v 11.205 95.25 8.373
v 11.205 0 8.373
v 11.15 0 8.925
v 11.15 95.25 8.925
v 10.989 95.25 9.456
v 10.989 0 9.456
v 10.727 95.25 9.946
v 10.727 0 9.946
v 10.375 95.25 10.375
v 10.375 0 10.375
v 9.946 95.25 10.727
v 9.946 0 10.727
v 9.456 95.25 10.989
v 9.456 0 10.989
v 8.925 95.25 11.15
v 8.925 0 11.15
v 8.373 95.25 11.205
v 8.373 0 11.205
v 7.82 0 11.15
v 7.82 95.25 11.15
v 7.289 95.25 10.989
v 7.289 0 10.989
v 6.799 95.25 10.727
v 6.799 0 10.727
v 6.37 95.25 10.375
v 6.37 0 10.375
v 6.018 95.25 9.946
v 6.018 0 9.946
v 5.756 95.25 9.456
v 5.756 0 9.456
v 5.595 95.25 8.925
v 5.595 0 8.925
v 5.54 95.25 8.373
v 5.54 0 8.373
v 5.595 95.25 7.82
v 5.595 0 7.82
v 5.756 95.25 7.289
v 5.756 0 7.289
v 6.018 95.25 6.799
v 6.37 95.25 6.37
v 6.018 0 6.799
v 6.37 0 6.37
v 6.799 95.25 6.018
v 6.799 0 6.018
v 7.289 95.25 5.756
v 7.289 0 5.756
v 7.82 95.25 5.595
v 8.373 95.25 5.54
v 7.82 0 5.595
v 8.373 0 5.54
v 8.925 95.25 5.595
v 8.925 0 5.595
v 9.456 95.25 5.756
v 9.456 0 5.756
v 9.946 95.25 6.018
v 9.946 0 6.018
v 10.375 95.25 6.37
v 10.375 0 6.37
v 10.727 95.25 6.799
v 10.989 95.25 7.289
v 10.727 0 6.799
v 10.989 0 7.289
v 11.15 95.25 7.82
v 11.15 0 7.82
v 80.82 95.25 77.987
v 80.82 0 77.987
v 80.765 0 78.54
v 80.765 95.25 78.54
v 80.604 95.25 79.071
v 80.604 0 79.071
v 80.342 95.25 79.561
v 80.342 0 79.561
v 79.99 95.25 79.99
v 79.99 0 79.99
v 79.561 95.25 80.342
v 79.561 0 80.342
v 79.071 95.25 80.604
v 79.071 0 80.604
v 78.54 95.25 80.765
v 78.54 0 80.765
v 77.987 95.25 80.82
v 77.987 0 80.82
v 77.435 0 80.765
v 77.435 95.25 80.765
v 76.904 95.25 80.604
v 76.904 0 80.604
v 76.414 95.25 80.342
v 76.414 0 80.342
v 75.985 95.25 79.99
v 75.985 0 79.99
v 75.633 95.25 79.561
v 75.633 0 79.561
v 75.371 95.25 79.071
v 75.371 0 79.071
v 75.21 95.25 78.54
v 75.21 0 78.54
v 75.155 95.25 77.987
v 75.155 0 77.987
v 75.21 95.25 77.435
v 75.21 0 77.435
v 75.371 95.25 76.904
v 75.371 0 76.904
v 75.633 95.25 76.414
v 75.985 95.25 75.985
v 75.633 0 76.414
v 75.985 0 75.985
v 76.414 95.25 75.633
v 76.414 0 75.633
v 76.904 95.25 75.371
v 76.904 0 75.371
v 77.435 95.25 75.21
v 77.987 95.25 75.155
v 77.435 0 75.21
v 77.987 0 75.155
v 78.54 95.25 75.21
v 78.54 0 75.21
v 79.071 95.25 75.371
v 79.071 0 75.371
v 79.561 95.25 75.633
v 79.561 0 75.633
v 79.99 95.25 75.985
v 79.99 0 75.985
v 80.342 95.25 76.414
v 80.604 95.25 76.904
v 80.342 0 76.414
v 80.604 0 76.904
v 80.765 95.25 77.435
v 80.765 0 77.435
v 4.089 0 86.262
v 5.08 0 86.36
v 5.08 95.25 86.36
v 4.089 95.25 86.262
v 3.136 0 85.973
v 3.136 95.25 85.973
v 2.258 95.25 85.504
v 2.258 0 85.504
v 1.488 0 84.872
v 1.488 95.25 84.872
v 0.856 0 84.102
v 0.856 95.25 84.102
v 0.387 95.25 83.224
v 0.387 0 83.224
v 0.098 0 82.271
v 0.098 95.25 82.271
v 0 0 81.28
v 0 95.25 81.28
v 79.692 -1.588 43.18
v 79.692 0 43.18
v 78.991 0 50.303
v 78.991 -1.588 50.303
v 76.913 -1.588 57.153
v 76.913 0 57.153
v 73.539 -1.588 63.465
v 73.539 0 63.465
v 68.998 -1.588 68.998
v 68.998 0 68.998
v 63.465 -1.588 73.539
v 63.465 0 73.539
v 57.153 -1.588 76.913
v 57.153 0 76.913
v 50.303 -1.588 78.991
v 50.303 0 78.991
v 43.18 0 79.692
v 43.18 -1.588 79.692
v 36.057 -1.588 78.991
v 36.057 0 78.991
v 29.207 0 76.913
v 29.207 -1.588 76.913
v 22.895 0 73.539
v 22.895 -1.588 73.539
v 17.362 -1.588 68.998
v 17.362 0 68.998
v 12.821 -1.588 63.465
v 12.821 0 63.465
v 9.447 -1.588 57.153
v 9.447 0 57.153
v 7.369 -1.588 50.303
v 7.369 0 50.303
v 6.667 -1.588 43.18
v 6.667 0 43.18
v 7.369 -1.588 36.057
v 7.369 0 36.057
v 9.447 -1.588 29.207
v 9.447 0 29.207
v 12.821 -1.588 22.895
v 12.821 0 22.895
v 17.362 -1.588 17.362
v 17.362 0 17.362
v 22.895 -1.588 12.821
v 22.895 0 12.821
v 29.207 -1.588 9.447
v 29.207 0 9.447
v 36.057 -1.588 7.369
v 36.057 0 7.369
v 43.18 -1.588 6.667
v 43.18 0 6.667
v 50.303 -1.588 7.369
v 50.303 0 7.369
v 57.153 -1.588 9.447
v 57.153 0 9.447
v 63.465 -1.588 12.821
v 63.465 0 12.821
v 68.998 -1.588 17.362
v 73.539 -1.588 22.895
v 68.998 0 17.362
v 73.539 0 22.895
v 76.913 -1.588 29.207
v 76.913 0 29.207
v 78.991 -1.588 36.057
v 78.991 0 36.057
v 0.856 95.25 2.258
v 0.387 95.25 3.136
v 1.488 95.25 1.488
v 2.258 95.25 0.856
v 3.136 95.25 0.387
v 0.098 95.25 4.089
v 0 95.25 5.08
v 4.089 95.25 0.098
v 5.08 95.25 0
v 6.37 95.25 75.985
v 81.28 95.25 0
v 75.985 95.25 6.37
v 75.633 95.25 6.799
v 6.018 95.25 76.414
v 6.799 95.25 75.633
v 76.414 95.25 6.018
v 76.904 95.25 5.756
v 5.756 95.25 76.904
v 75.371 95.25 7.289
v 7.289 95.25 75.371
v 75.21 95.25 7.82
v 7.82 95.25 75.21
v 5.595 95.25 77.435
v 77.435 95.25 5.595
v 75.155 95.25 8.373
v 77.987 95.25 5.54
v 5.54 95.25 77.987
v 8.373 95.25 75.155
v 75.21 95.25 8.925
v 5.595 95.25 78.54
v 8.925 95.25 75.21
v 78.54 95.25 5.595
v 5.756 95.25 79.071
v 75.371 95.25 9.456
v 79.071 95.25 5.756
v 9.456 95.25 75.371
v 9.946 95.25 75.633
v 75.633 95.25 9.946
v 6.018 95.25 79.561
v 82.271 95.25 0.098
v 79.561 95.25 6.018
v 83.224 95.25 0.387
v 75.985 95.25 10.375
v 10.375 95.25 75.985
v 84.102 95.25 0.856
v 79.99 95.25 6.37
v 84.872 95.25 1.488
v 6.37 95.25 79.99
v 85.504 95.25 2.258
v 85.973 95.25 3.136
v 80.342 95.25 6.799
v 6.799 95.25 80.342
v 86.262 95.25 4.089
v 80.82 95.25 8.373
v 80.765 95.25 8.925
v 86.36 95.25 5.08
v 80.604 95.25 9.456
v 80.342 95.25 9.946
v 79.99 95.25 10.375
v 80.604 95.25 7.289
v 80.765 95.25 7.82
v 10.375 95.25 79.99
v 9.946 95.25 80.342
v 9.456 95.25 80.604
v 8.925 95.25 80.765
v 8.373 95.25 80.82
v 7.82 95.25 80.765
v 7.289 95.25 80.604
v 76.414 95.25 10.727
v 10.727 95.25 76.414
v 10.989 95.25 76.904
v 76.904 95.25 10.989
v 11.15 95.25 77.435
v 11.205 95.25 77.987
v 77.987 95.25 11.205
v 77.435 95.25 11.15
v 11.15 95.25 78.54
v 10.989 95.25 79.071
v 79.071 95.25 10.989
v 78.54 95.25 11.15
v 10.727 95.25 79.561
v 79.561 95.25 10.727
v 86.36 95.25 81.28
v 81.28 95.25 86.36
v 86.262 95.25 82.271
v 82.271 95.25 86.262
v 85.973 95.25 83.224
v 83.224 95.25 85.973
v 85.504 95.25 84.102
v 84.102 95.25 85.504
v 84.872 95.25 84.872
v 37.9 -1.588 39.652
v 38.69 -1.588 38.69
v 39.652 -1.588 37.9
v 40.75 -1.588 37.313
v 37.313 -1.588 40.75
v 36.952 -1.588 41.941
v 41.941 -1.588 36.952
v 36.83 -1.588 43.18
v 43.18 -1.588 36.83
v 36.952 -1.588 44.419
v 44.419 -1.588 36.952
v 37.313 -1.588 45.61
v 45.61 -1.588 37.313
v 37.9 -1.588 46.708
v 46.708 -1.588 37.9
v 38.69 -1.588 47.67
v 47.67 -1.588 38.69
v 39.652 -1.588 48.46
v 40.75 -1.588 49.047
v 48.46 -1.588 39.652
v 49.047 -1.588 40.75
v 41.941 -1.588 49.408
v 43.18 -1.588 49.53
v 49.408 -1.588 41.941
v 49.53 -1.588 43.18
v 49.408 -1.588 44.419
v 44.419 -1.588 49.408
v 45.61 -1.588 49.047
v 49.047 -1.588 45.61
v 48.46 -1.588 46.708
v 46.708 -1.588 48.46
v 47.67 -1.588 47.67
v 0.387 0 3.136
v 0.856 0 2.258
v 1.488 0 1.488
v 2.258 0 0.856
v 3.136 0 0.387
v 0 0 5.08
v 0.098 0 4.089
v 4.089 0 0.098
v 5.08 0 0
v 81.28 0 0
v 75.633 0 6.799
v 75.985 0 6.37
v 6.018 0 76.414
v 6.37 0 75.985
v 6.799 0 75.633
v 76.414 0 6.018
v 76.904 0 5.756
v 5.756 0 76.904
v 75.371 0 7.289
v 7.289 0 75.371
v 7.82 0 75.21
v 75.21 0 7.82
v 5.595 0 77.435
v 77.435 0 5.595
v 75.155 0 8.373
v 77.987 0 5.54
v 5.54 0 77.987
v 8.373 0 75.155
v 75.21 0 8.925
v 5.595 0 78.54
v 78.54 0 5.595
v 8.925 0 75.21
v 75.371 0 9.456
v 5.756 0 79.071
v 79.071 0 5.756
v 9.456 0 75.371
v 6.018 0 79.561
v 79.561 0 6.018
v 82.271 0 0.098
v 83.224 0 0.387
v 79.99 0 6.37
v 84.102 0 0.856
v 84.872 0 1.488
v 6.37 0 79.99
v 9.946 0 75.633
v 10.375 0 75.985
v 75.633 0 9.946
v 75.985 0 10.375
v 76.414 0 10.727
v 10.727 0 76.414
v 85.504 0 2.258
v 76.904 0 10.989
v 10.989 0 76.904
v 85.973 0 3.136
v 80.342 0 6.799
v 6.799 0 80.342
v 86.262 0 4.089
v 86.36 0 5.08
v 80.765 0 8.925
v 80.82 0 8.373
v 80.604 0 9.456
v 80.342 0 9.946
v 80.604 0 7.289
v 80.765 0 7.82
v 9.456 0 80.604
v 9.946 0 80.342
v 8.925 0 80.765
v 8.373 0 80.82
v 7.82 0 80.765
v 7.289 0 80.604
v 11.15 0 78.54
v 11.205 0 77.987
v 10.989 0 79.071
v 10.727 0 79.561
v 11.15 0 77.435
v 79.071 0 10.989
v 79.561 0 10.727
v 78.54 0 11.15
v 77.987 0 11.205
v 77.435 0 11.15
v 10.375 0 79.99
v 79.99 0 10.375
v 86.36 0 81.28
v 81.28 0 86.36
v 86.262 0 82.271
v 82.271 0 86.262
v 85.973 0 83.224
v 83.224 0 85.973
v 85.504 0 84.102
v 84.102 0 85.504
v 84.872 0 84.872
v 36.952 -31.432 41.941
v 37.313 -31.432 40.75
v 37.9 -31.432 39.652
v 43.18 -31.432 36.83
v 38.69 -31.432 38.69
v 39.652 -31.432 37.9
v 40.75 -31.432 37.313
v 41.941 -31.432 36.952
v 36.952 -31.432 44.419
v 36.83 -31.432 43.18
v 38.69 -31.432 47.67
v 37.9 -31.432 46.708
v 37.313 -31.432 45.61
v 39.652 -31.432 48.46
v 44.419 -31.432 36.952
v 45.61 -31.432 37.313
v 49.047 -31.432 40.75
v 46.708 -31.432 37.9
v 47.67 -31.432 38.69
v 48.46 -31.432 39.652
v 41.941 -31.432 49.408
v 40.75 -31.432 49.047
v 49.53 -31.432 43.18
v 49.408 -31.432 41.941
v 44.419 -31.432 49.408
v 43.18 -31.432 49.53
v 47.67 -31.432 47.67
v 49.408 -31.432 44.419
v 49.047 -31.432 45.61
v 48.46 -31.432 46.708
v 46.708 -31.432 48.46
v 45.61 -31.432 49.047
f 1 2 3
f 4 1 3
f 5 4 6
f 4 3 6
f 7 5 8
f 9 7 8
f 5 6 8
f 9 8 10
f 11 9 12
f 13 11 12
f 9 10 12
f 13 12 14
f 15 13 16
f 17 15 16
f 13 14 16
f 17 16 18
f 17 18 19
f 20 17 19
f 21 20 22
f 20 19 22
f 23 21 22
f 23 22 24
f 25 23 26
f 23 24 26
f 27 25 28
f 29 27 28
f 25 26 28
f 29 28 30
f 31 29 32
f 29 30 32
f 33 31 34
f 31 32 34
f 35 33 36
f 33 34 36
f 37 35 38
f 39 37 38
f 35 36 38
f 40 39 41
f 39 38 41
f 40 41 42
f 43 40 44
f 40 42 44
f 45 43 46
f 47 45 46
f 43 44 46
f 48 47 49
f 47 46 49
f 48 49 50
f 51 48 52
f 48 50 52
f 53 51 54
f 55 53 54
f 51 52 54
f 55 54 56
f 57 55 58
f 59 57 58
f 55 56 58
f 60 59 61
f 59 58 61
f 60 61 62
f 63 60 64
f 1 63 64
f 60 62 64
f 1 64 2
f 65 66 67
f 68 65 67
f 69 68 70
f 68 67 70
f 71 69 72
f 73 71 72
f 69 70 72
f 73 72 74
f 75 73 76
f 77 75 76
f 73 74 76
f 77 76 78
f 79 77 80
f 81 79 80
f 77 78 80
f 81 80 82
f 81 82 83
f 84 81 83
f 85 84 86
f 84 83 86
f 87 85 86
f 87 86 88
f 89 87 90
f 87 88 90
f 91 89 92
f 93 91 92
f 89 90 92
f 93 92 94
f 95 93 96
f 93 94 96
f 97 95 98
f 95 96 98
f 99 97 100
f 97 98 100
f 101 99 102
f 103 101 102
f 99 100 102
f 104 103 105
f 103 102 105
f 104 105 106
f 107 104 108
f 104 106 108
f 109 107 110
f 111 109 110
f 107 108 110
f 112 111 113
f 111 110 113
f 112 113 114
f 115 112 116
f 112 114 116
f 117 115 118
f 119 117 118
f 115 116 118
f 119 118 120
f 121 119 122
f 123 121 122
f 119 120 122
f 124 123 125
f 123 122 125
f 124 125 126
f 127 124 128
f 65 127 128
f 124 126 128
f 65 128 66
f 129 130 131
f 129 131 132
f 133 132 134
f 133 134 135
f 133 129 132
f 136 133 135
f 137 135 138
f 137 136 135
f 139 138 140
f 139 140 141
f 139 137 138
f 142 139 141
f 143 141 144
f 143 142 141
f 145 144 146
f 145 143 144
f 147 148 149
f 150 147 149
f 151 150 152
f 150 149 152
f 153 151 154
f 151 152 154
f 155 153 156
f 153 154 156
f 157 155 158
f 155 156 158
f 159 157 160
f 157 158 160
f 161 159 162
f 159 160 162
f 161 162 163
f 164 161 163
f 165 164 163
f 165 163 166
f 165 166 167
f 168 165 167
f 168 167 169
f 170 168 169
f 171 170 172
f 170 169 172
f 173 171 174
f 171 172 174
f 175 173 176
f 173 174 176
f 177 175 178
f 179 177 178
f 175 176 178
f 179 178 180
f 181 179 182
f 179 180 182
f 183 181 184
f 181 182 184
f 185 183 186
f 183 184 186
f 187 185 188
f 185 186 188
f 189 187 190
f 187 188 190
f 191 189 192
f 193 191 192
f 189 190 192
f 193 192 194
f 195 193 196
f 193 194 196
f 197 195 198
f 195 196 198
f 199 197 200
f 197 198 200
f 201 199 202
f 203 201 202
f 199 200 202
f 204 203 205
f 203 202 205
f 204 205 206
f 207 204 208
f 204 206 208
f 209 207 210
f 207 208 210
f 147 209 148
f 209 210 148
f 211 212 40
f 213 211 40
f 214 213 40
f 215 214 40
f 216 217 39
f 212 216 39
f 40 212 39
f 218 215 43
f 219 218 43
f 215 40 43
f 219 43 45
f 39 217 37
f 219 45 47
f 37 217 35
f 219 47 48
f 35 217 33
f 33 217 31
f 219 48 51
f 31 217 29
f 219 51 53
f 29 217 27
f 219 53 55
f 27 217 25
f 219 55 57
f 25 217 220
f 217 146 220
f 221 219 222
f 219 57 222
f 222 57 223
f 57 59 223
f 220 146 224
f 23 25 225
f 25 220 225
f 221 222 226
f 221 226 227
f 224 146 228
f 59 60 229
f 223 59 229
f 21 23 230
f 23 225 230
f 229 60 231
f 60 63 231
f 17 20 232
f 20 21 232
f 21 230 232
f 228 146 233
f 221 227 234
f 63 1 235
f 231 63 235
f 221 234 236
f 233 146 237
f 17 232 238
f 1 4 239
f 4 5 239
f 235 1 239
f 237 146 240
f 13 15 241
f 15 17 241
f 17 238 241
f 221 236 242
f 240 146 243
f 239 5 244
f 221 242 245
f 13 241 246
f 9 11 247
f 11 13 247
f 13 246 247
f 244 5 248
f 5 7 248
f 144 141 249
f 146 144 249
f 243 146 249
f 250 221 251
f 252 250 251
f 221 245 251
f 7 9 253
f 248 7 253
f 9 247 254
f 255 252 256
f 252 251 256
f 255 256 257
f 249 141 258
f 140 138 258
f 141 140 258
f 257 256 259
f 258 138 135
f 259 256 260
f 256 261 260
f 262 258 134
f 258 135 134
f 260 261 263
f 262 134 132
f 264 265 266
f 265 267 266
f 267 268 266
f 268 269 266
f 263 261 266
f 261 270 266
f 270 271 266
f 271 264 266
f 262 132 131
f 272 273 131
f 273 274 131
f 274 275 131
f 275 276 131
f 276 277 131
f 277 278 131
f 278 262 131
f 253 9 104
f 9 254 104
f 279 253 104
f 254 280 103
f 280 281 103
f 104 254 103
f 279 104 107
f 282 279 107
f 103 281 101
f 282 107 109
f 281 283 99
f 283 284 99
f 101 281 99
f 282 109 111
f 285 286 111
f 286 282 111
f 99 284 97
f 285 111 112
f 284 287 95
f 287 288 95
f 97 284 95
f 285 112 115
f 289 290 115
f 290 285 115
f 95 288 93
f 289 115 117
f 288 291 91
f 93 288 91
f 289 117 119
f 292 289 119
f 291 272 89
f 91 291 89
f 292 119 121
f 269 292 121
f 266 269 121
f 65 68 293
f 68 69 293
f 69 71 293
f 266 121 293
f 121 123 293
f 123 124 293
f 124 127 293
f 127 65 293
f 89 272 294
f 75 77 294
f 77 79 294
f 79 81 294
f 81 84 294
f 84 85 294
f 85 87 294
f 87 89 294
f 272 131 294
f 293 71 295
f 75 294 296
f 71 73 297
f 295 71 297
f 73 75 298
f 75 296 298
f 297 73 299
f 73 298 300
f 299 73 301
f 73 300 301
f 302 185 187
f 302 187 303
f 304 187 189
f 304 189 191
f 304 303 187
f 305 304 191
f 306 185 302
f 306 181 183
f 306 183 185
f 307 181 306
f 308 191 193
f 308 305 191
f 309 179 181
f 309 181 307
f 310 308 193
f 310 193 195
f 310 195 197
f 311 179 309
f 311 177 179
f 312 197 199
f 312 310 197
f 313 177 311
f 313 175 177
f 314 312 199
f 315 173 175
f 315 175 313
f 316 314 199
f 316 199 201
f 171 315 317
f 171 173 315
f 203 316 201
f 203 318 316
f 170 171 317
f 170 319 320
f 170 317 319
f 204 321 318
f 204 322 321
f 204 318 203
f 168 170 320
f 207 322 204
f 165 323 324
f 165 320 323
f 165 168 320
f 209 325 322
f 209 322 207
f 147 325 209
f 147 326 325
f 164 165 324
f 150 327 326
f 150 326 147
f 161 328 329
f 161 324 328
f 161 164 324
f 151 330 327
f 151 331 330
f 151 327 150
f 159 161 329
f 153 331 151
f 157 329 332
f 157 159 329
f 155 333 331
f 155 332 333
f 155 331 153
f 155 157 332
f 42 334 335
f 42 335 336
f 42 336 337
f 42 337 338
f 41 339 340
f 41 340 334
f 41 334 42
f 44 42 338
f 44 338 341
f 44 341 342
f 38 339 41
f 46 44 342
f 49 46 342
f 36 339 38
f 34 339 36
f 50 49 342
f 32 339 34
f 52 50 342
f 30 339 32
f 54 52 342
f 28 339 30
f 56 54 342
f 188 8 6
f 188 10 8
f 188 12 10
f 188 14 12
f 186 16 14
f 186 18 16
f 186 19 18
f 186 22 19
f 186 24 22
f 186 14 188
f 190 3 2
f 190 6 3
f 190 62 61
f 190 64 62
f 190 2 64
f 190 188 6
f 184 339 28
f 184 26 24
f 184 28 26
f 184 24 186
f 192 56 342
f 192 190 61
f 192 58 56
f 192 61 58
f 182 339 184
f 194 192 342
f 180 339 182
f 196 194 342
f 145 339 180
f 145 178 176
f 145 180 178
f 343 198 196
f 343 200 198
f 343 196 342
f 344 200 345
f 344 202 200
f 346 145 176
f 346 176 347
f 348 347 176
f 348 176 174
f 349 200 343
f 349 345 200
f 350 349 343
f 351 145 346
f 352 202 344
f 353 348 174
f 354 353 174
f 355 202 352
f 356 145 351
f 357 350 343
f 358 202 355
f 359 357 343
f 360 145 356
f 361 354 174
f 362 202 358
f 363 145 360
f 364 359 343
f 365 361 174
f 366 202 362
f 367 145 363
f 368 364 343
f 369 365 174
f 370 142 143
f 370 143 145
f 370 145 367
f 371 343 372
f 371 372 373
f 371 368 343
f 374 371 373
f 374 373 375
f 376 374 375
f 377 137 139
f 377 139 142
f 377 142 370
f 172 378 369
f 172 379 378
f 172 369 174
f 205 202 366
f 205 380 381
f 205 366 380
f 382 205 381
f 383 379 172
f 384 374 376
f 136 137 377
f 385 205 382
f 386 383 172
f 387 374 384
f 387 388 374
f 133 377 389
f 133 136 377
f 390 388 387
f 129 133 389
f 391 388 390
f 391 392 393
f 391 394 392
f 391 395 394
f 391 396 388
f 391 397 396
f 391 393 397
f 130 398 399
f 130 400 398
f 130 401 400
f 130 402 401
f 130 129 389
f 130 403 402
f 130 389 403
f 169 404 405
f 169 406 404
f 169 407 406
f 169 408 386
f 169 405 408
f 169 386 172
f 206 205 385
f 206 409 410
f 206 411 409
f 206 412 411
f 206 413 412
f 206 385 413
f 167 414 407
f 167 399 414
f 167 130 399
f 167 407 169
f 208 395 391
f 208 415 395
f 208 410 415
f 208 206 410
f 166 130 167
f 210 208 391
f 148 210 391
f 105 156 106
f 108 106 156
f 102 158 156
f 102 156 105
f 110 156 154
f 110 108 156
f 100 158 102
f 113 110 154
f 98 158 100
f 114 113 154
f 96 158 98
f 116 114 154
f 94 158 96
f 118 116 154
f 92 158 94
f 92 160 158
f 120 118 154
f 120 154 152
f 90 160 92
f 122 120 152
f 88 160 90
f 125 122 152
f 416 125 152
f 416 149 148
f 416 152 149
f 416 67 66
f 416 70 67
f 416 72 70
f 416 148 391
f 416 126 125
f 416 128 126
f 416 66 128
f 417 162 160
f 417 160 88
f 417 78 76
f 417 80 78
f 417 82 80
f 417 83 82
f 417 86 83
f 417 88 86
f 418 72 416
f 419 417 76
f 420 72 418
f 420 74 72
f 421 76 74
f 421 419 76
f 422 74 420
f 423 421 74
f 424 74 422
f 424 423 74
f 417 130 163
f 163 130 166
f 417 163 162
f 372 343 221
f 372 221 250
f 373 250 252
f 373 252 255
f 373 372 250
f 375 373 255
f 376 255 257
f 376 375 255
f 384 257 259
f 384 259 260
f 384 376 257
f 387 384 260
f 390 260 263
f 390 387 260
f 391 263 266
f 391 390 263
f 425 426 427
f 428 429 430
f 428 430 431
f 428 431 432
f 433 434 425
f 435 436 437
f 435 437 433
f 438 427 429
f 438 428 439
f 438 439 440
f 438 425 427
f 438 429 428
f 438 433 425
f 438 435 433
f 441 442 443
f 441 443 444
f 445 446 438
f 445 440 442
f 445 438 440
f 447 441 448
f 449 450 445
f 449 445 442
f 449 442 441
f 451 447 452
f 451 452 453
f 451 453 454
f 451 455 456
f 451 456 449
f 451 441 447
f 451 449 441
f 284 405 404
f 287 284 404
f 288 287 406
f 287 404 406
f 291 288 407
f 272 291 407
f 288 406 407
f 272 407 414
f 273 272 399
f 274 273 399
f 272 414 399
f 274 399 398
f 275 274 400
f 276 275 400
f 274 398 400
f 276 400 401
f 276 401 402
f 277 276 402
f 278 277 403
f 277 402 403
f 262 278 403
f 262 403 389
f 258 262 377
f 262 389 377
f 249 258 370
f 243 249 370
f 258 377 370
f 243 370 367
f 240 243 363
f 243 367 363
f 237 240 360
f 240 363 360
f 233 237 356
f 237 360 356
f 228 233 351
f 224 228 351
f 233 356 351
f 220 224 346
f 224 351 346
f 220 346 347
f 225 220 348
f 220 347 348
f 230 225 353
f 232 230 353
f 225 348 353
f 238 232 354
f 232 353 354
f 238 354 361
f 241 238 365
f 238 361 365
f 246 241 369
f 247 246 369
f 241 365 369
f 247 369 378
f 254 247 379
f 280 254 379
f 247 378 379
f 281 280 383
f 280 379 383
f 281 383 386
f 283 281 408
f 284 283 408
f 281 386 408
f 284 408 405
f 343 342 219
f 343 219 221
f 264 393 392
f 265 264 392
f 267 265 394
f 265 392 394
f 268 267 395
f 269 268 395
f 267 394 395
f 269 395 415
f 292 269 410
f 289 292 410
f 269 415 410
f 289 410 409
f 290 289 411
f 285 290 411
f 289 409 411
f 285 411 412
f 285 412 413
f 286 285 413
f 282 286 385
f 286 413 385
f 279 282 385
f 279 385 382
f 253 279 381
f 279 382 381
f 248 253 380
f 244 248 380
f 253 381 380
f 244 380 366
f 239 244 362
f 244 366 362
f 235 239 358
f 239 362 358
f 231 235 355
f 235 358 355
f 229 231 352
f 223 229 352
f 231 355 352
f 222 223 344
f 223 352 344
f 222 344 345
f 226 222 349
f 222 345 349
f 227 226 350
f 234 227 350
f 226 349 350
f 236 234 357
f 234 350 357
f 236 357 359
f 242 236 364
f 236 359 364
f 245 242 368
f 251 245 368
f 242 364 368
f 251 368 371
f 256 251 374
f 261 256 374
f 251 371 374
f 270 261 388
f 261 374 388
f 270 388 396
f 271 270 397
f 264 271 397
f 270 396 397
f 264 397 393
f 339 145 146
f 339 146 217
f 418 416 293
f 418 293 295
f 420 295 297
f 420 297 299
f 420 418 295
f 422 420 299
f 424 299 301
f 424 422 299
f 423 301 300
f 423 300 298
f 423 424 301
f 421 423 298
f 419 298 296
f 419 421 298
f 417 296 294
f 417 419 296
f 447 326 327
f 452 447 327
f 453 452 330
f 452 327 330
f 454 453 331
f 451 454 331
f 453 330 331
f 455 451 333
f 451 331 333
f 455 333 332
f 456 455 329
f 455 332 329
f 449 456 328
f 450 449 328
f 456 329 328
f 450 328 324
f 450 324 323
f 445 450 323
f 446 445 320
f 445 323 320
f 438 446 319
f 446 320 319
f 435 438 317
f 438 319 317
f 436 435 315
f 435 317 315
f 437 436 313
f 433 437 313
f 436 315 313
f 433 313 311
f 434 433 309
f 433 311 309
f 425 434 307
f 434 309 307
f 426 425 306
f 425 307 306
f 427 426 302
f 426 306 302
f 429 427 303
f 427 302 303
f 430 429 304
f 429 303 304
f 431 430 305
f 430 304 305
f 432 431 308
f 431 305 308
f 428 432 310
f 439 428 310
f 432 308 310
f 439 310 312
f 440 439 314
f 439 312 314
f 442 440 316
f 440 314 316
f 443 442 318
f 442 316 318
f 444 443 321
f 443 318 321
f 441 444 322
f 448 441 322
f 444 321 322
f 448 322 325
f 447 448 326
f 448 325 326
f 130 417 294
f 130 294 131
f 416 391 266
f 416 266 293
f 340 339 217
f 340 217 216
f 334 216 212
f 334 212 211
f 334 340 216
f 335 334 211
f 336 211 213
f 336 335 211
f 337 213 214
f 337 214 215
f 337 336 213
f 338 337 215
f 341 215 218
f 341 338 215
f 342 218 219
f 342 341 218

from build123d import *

# Parameters (mm, degrees)
F0_R     = 2.8321
F1_DEPTH = 95.25
F2_R     = 36.5125
F3_DEPTH = 1.5875
F4_R     = 6.35
F5_DEPTH = 29.845


with BuildPart() as f1:
    # F0 (on Front) → F1 (new body)
    with BuildSketch(Plane.XZ):
        with BuildLine():
            ThreePointArc((0, 5.08), (1.487898, 1.487898), (5.08, 0))
            Line((5.08, 0), (81.28, 0))
            ThreePointArc((81.28, 0), (84.872102, 1.487898), (86.36, 5.08))
            Line((86.36, 5.08), (86.36, 81.28))
            ThreePointArc((86.36, 81.28), (84.872102, 84.872102), (81.28, 86.36))
            Line((81.28, 86.36), (5.08, 86.36))
            ThreePointArc((5.08, 86.36), (1.487898, 84.872102), (0, 81.28))
            Line((0, 81.28), (0, 5.08))
        make_face()
        with Locations((8.372527, 8.372527)):
            Circle(F0_R, mode=Mode.SUBTRACT)
        with Locations((77.987473, 8.372527)):
            Circle(F0_R, mode=Mode.SUBTRACT)
        with Locations((8.372527, 77.987473)):
            Circle(F0_R, mode=Mode.SUBTRACT)
        with Locations((77.987473, 77.987473)):
            Circle(F0_R, mode=Mode.SUBTRACT)
    extrude(amount=-F1_DEPTH)

    # F2 (on face) → F3 (join)
    with BuildSketch(Plane.XZ):
        with Locations((43.18, 43.18)):
            Circle(F2_R)
    extrude(amount=F3_DEPTH)

    # F4 (on face) → F5 (join)
    with BuildSketch(Plane.XZ.offset(1.5875)):
        with Locations((43.18, 43.18)):
            Circle(F4_R)
    extrude(amount=F5_DEPTH)


solid = f1.part
